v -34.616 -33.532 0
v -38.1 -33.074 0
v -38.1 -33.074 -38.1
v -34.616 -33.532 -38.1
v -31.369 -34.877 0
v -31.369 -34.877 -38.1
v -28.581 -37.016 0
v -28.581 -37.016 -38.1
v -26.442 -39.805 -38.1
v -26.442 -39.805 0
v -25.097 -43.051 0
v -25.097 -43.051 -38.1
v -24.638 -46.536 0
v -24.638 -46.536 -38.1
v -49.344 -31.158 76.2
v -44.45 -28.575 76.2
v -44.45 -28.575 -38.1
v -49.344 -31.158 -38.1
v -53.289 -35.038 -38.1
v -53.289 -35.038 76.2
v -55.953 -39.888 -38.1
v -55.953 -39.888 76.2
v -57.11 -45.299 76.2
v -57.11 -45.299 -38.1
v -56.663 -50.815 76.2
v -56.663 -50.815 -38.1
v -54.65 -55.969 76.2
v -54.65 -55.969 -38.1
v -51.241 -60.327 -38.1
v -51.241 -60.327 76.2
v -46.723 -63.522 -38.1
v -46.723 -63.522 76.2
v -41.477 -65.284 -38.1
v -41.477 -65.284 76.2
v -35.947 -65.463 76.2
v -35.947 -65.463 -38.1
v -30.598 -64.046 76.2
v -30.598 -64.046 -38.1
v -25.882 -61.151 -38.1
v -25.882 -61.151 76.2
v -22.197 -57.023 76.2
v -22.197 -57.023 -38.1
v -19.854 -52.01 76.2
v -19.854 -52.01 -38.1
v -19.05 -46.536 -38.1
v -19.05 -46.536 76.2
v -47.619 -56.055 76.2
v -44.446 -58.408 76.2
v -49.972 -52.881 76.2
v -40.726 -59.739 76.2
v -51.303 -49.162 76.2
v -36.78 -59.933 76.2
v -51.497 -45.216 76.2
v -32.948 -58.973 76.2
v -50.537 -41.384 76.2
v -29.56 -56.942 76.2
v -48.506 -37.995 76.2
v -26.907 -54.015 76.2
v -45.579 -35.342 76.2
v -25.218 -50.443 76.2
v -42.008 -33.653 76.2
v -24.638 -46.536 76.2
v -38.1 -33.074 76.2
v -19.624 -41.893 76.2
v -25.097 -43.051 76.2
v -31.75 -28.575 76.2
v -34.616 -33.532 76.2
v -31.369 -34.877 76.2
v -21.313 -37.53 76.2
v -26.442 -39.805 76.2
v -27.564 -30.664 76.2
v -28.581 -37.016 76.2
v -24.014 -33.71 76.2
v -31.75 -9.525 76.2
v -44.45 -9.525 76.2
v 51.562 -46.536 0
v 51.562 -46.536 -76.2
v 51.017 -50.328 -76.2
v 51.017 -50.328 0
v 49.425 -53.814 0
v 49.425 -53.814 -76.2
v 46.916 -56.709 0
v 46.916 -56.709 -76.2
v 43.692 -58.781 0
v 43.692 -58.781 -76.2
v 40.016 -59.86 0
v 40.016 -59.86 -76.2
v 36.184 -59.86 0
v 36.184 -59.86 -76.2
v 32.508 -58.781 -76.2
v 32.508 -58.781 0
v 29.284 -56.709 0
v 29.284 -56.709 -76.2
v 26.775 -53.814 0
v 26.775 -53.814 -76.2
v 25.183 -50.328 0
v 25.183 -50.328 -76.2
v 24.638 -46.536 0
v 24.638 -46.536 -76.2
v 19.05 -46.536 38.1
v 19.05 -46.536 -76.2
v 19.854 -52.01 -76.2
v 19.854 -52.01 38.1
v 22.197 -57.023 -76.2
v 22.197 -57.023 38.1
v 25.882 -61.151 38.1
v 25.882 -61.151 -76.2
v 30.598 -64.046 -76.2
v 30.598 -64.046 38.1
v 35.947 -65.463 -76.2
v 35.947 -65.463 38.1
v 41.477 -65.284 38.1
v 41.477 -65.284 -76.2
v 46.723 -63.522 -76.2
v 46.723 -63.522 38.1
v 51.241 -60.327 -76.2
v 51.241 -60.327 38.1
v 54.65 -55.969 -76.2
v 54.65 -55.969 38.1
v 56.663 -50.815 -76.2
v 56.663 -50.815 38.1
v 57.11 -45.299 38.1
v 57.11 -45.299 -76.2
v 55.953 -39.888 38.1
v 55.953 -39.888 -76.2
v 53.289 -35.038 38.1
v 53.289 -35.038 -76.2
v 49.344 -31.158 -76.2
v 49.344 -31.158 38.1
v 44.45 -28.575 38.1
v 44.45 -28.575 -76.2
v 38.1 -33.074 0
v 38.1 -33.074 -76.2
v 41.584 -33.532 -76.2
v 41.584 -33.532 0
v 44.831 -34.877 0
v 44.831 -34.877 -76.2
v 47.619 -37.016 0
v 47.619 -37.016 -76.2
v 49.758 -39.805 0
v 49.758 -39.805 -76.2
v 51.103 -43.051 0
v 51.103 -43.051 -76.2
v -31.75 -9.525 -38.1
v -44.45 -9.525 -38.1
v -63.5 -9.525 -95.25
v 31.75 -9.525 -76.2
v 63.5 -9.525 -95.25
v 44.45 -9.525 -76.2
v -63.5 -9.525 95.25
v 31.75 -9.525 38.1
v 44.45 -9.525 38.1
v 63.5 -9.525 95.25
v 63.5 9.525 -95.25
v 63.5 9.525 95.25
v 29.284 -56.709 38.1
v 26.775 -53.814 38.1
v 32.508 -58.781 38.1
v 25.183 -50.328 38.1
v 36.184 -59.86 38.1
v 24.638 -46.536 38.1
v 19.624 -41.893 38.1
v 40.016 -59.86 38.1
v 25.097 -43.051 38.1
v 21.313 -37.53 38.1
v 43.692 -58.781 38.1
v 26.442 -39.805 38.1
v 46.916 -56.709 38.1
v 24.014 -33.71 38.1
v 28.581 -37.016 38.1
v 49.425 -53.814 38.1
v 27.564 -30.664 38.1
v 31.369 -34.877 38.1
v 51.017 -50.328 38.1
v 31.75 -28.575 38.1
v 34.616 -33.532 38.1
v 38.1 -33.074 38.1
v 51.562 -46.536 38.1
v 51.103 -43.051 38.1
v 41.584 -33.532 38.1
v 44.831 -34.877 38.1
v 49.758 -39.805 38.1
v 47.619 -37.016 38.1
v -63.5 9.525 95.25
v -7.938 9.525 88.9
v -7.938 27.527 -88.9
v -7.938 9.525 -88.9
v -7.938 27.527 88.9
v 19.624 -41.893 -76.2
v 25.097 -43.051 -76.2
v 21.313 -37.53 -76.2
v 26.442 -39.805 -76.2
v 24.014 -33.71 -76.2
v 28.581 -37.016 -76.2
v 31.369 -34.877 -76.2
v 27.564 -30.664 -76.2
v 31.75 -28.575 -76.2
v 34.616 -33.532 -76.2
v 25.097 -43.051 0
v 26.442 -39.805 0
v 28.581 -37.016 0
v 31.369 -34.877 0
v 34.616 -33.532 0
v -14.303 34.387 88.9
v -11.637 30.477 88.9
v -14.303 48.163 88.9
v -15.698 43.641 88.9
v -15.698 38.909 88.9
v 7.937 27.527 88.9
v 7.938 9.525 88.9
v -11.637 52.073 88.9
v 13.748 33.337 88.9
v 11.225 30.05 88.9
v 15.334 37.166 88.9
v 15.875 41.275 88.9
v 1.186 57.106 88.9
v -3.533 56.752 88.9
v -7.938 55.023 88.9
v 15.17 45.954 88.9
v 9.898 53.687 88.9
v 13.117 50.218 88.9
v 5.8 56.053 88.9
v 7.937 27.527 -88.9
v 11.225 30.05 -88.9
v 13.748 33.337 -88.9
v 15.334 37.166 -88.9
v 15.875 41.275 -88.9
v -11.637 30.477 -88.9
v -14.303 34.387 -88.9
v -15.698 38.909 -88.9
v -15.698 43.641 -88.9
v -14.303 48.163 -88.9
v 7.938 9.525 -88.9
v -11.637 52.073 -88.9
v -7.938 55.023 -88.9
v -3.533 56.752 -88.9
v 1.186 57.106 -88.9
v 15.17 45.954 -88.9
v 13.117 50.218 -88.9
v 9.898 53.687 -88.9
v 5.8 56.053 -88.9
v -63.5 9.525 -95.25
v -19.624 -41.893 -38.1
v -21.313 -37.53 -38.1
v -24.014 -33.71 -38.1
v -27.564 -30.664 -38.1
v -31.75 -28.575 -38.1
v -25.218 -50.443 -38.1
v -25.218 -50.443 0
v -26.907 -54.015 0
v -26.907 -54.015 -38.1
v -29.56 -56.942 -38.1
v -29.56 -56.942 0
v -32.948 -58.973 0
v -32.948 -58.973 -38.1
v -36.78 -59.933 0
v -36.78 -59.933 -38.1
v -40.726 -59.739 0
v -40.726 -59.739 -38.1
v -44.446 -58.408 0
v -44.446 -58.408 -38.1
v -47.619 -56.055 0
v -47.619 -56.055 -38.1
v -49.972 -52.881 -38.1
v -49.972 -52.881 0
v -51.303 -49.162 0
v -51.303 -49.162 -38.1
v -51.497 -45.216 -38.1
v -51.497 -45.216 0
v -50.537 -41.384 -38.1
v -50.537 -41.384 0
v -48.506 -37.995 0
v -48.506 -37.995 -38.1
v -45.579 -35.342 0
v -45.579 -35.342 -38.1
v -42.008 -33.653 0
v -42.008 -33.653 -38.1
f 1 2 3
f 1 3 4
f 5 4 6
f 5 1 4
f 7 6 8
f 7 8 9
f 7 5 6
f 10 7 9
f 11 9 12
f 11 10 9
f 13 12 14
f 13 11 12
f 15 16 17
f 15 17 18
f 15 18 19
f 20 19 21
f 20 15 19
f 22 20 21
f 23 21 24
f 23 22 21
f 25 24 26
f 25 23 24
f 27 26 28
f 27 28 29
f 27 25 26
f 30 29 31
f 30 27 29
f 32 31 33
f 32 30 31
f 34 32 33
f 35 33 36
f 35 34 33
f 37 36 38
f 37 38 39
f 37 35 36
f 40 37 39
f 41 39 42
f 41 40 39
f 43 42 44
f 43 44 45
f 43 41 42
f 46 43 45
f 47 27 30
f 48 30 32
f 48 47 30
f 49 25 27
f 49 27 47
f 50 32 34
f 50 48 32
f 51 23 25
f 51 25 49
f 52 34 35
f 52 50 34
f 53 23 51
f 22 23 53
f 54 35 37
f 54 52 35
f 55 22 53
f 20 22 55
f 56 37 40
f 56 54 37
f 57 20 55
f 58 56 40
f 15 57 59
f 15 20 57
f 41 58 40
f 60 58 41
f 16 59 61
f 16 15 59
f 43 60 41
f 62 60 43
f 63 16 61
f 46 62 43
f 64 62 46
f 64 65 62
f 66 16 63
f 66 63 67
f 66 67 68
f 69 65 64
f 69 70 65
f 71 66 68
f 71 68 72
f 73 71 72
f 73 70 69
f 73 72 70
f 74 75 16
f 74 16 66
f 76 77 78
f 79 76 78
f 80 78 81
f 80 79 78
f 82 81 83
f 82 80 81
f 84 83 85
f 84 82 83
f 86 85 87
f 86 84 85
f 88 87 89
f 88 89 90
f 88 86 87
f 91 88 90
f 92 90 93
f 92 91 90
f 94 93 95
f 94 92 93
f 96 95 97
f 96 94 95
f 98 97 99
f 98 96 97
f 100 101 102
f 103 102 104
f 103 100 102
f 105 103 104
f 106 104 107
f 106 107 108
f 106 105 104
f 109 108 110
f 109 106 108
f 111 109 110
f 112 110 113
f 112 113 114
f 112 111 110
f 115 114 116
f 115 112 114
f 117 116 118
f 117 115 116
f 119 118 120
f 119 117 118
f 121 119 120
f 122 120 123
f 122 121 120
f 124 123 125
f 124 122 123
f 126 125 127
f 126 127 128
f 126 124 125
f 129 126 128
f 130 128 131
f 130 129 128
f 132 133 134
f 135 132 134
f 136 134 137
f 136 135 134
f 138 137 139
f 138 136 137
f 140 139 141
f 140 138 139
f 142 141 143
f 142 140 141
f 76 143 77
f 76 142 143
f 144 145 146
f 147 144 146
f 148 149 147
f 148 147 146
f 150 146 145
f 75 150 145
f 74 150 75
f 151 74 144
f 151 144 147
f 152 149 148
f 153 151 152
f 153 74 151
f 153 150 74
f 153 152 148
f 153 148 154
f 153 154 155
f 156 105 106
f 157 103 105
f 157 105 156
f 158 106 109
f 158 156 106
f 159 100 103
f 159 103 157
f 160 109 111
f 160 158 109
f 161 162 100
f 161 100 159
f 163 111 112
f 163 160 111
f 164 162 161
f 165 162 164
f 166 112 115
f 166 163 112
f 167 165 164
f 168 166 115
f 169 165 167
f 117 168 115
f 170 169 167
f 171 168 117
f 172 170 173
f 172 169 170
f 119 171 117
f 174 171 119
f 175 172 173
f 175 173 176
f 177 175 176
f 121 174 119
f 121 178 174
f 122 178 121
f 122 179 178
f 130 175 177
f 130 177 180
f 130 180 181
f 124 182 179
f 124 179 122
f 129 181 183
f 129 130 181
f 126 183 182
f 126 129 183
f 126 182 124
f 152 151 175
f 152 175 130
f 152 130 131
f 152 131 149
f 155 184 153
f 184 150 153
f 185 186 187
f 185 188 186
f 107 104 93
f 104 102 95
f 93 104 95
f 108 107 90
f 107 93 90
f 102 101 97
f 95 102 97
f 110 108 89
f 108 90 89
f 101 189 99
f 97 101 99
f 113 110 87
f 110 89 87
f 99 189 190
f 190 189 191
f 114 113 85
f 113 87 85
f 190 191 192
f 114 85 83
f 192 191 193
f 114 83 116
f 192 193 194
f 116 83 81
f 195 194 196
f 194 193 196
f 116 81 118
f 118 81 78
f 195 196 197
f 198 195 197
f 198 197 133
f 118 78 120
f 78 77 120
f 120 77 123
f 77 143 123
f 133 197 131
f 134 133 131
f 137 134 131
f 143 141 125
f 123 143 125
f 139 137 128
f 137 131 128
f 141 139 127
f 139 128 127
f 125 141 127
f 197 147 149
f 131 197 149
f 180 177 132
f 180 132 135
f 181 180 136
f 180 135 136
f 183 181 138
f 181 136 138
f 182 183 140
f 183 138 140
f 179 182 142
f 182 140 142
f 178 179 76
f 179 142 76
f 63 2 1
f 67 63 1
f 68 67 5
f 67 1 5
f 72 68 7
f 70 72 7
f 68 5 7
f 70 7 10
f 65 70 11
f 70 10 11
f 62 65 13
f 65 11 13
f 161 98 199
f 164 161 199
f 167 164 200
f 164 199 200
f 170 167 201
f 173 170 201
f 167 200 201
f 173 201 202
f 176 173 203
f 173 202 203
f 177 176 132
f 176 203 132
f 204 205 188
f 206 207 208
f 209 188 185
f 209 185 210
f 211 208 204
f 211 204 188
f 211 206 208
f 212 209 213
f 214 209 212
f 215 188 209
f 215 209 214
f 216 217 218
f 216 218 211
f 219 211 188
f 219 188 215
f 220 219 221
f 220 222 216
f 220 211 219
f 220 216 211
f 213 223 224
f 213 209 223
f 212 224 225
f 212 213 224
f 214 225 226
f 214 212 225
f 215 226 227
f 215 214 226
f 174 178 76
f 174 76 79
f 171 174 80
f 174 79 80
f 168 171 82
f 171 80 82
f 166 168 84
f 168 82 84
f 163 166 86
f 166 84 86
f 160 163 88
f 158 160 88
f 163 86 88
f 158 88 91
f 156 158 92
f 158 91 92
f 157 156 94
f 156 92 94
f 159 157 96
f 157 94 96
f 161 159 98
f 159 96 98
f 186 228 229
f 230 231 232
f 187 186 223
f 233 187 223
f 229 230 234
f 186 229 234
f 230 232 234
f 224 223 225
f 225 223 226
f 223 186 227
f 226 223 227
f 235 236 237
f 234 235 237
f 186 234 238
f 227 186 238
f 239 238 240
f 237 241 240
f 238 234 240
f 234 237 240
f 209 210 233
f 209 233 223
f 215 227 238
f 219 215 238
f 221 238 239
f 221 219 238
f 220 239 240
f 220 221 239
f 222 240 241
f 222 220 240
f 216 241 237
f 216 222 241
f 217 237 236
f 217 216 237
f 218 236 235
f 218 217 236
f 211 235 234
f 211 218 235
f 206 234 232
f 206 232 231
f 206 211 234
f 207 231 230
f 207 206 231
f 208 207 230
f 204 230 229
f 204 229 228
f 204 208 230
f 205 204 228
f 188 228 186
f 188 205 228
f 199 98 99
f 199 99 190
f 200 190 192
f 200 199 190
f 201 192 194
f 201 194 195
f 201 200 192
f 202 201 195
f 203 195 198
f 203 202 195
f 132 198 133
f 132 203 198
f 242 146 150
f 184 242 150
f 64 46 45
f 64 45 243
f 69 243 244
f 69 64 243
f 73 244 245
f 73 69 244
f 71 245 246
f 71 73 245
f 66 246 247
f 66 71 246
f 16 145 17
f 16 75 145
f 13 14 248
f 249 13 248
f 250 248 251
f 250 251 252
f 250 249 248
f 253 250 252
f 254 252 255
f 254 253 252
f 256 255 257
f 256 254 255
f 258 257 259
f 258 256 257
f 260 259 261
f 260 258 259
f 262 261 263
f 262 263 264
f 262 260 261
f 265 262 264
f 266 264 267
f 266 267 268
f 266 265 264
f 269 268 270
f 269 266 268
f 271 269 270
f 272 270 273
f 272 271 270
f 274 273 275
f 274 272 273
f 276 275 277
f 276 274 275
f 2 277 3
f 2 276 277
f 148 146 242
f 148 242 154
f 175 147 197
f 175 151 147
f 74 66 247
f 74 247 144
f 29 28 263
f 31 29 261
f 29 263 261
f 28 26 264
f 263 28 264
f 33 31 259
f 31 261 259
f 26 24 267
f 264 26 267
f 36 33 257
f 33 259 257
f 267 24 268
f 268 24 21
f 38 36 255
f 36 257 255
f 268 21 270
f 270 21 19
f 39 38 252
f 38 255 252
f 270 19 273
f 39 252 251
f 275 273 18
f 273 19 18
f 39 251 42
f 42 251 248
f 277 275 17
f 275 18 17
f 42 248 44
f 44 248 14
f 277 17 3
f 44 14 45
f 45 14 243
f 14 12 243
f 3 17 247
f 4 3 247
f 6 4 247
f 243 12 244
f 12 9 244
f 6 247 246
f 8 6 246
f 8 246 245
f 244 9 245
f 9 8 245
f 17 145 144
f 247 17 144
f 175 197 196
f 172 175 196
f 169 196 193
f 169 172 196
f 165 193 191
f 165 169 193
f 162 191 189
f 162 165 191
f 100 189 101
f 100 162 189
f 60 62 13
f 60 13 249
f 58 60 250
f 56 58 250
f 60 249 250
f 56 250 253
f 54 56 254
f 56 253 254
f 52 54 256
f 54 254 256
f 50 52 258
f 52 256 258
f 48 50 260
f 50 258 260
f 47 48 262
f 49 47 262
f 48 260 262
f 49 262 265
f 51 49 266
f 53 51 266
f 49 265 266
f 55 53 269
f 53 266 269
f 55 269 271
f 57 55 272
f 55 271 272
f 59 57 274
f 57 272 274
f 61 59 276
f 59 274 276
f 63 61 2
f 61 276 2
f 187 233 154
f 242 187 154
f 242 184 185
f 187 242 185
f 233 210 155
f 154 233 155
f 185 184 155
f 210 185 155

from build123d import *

# Parameters (mm, degrees)
F0_W          = 127
F0_H          = 190.5
F1_DEPTH      = 9.525
F3_DEPTH      = 76.2
F3_DEPTH_BACK = 38.1
F4_DEPTH      = 38.1
F4_DEPTH_BACK = 76.2
F6_DEPTH      = 88.9


with BuildPart() as f1:
    # F0 (on Front) → F1 (new body, symmetric)
    with BuildSketch(Plane.XZ):
        Rectangle(F0_W, F0_H)
    extrude(amount=F1_DEPTH, both=True)

    # F2 (on Top) → F3 (join, two sides)
    with BuildSketch(Plane.XY) as f3_sk:
        with BuildLine():
            Line((-38.1, -9.525), (-44.45, -9.525))
            Line((-44.45, -9.525), (-44.45, -28.575))
            ThreePointArc((-44.45, -28.575), (-49.0985226281, -62.0897721088), (-19.05, -46.5355122421))
            Line((-19.05, -46.5355122421), (-24.638, -46.5355122421))
            ThreePointArc((-24.638, -46.5355122421), (-47.6190714883, -56.0545837305), (-38.1, -33.0735122421))
            Line((-38.1, -33.0735122421), (-38.1, -9.525))
        make_face()
        with BuildLine():
            Line((-31.75, -9.525), (-38.1, -9.525))
            Line((-38.1, -9.525), (-38.1, -33.0735122421))
            ThreePointArc((-38.1, -33.0735122421), (-28.5809285117, -37.0164407538), (-24.638, -46.5355122421))
            Line((-24.638, -46.5355122421), (-19.05, -46.5355122421))
            ThreePointArc((-19.05, -46.5355122421), (-22.5457401333, -35.5369896141), (-31.75, -28.575))
            Line((-31.75, -28.575), (-31.75, -9.525))
        make_face()
    extrude(amount=F3_DEPTH)
    extrude(f3_sk.sketch, amount=-F3_DEPTH_BACK)

    # F2 (on Top) → F4 (join, two sides)
    with BuildSketch(Plane.XY) as f4_sk:
        with BuildLine():
            Line((24.638, -46.5355122421), (19.05, -46.5355122421))
            ThreePointArc((19.05, -46.5355122421), (49.0985226281, -62.0897721088), (44.45, -28.575))
            Line((44.45, -28.575), (44.45, -9.525))
            Line((44.45, -9.525), (38.1, -9.525))
            Line((38.1, -9.525), (38.1, -33.0735122421))
            ThreePointArc((38.1, -33.0735122421), (47.6190714883, -37.0164407538), (51.562, -46.5355122421))
            ThreePointArc((51.562, -46.5355122421), (38.1, -59.9975122421), (24.638, -46.5355122421))
        make_face()
        with BuildLine():
            ThreePointArc((31.75, -28.575), (22.5457401333, -35.5369896141), (19.05, -46.5355122421))
            Line((19.05, -46.5355122421), (24.638, -46.5355122421))
            ThreePointArc((24.638, -46.5355122421), (28.5809285117, -37.0164407538), (38.1, -33.0735122421))
            Line((38.1, -33.0735122421), (38.1, -9.525))
            Line((38.1, -9.525), (31.75, -9.525))
            Line((31.75, -9.525), (31.75, -28.575))
        make_face()
    extrude(amount=F4_DEPTH)
    extrude(f4_sk.sketch, amount=-F4_DEPTH_BACK)

    # F5 (on Top) → F6 (join, symmetric)
    with BuildSketch(Plane.XY):
        with BuildLine():
            Line((-7.9375, 27.5268467149), (-7.9375, 9.525))
            Line((-7.9375, 9.525), (0, 9.525))
            Line((0, 9.525), (7.9375, 9.525))
            Line((7.9375, 9.525), (7.9375, 27.5268467149))
            ThreePointArc((7.9375, 27.5268467149), (0, 25.4), (-7.9375, 27.5268467149))
        make_face()
        with BuildLine():
            ThreePointArc((15.875, 41.275), (-7.9375, 55.0231532851), (-7.9375, 27.5268467149))
            ThreePointArc((-7.9375, 27.5268467149), (0, 25.4), (7.9375, 27.5268467149))
            ThreePointArc((7.9375, 27.5268467149), (13.7481532851, 33.3375), (15.875, 41.275))
        make_face()
    extrude(amount=F6_DEPTH, both=True)


solid = f1.part
